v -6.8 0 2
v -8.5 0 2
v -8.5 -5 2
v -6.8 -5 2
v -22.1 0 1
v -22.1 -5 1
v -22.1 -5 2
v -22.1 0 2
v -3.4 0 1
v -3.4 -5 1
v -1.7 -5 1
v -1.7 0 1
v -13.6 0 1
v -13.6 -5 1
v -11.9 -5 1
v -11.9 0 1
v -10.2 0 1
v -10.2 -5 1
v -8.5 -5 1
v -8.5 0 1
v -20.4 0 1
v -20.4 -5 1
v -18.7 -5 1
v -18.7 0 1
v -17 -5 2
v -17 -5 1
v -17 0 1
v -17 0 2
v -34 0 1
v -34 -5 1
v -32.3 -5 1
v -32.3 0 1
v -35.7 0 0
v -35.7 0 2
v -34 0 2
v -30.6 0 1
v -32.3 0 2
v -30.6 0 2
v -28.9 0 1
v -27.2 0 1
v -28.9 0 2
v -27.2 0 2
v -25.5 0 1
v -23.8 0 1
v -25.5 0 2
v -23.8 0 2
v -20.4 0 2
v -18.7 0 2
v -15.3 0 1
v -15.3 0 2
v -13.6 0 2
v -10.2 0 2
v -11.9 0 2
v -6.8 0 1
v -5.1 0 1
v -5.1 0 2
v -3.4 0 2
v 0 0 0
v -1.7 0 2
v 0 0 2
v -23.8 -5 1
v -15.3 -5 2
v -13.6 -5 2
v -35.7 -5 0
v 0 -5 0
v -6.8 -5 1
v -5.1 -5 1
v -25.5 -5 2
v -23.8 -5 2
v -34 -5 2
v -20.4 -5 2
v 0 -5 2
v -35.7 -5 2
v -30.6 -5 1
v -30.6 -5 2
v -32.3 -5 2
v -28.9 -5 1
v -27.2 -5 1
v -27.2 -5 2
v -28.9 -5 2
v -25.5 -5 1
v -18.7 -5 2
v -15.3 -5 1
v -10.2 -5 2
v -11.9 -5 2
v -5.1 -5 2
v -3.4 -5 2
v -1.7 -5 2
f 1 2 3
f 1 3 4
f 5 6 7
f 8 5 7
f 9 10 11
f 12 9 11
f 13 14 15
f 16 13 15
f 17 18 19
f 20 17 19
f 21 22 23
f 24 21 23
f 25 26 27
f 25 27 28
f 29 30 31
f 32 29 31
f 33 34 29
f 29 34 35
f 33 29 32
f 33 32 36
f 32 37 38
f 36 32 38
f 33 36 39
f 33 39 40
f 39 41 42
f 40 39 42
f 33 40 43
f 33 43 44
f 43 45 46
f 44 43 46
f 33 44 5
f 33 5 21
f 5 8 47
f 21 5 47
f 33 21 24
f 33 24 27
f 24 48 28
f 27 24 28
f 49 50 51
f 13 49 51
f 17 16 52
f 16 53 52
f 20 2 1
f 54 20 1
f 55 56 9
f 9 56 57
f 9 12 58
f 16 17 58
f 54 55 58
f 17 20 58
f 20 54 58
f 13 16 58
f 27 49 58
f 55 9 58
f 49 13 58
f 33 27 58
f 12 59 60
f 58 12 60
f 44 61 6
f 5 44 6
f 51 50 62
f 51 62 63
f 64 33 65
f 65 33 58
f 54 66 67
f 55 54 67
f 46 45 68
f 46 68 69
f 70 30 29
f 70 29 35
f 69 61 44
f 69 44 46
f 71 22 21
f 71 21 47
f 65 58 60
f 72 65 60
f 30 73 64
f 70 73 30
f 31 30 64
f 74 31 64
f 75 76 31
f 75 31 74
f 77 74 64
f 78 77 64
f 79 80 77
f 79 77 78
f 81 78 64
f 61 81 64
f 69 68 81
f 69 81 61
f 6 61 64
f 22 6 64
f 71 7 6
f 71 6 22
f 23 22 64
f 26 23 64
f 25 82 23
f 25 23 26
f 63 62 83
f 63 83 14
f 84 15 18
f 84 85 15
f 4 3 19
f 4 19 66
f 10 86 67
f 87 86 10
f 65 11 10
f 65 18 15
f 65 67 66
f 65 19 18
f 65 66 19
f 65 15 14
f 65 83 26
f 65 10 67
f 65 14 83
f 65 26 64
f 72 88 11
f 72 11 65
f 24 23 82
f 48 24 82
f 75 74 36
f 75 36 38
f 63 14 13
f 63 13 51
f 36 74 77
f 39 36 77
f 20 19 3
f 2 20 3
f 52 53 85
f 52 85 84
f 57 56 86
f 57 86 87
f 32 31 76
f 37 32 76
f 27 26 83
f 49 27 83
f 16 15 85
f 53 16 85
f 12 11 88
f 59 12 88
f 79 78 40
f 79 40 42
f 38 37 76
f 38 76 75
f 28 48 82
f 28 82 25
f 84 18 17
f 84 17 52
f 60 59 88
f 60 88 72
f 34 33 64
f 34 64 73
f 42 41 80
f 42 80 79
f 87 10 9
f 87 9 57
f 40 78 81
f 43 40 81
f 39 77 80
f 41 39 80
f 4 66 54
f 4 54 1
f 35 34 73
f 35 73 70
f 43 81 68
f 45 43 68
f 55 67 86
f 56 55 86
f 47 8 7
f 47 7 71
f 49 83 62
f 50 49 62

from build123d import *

# Parameters (mm, degrees)
F0_W     = 35.7
F0_H     = 2
F1_DEPTH = 5
F2_W     = 1.7
F2_H     = 1
F3_DEPTH = 5
F4_DEPTH = 5


with BuildPart() as f1:
    # F0 (on Front) → F1 (new body)
    with BuildSketch(Plane.XZ):
        with Locations((-17.85, 1)):
            Rectangle(F0_W, F0_H)
    extrude(amount=F1_DEPTH)

    # F2 (on face) → F3 (cut)
    with BuildSketch(Plane.XZ.offset(5)):
        with Locations((-33.15, 1.5)):
            Rectangle(F2_W, F2_H)
        with Locations((-29.75, 1.5)):
            Rectangle(F2_W, F2_H)
        with Locations((-26.35, 1.5)):
            Rectangle(F2_W, F2_H)
        with Locations((-22.95, 1.5)):
            Rectangle(F2_W, F2_H)
        with Locations((-19.55, 1.5)):
            Rectangle(F2_W, F2_H)
        with Locations((-16.15, 1.5)):
            Rectangle(F2_W, F2_H)
        with Locations((-12.75, 1.5)):
            Rectangle(F2_W, F2_H)
    extrude(amount=-F3_DEPTH, mode=Mode.SUBTRACT)

    # F2 (on face) → F4 (cut)
    with BuildSketch(Plane.XZ.offset(5)):
        with Locations((-9.35, 1.5)):
            Rectangle(F2_W, F2_H)
        with Locations((-5.95, 1.5)):
            Rectangle(F2_W, F2_H)
        with Locations((-2.55, 1.5)):
            Rectangle(F2_W, F2_H)
    extrude(amount=-F4_DEPTH, mode=Mode.SUBTRACT)


solid = f1.part
